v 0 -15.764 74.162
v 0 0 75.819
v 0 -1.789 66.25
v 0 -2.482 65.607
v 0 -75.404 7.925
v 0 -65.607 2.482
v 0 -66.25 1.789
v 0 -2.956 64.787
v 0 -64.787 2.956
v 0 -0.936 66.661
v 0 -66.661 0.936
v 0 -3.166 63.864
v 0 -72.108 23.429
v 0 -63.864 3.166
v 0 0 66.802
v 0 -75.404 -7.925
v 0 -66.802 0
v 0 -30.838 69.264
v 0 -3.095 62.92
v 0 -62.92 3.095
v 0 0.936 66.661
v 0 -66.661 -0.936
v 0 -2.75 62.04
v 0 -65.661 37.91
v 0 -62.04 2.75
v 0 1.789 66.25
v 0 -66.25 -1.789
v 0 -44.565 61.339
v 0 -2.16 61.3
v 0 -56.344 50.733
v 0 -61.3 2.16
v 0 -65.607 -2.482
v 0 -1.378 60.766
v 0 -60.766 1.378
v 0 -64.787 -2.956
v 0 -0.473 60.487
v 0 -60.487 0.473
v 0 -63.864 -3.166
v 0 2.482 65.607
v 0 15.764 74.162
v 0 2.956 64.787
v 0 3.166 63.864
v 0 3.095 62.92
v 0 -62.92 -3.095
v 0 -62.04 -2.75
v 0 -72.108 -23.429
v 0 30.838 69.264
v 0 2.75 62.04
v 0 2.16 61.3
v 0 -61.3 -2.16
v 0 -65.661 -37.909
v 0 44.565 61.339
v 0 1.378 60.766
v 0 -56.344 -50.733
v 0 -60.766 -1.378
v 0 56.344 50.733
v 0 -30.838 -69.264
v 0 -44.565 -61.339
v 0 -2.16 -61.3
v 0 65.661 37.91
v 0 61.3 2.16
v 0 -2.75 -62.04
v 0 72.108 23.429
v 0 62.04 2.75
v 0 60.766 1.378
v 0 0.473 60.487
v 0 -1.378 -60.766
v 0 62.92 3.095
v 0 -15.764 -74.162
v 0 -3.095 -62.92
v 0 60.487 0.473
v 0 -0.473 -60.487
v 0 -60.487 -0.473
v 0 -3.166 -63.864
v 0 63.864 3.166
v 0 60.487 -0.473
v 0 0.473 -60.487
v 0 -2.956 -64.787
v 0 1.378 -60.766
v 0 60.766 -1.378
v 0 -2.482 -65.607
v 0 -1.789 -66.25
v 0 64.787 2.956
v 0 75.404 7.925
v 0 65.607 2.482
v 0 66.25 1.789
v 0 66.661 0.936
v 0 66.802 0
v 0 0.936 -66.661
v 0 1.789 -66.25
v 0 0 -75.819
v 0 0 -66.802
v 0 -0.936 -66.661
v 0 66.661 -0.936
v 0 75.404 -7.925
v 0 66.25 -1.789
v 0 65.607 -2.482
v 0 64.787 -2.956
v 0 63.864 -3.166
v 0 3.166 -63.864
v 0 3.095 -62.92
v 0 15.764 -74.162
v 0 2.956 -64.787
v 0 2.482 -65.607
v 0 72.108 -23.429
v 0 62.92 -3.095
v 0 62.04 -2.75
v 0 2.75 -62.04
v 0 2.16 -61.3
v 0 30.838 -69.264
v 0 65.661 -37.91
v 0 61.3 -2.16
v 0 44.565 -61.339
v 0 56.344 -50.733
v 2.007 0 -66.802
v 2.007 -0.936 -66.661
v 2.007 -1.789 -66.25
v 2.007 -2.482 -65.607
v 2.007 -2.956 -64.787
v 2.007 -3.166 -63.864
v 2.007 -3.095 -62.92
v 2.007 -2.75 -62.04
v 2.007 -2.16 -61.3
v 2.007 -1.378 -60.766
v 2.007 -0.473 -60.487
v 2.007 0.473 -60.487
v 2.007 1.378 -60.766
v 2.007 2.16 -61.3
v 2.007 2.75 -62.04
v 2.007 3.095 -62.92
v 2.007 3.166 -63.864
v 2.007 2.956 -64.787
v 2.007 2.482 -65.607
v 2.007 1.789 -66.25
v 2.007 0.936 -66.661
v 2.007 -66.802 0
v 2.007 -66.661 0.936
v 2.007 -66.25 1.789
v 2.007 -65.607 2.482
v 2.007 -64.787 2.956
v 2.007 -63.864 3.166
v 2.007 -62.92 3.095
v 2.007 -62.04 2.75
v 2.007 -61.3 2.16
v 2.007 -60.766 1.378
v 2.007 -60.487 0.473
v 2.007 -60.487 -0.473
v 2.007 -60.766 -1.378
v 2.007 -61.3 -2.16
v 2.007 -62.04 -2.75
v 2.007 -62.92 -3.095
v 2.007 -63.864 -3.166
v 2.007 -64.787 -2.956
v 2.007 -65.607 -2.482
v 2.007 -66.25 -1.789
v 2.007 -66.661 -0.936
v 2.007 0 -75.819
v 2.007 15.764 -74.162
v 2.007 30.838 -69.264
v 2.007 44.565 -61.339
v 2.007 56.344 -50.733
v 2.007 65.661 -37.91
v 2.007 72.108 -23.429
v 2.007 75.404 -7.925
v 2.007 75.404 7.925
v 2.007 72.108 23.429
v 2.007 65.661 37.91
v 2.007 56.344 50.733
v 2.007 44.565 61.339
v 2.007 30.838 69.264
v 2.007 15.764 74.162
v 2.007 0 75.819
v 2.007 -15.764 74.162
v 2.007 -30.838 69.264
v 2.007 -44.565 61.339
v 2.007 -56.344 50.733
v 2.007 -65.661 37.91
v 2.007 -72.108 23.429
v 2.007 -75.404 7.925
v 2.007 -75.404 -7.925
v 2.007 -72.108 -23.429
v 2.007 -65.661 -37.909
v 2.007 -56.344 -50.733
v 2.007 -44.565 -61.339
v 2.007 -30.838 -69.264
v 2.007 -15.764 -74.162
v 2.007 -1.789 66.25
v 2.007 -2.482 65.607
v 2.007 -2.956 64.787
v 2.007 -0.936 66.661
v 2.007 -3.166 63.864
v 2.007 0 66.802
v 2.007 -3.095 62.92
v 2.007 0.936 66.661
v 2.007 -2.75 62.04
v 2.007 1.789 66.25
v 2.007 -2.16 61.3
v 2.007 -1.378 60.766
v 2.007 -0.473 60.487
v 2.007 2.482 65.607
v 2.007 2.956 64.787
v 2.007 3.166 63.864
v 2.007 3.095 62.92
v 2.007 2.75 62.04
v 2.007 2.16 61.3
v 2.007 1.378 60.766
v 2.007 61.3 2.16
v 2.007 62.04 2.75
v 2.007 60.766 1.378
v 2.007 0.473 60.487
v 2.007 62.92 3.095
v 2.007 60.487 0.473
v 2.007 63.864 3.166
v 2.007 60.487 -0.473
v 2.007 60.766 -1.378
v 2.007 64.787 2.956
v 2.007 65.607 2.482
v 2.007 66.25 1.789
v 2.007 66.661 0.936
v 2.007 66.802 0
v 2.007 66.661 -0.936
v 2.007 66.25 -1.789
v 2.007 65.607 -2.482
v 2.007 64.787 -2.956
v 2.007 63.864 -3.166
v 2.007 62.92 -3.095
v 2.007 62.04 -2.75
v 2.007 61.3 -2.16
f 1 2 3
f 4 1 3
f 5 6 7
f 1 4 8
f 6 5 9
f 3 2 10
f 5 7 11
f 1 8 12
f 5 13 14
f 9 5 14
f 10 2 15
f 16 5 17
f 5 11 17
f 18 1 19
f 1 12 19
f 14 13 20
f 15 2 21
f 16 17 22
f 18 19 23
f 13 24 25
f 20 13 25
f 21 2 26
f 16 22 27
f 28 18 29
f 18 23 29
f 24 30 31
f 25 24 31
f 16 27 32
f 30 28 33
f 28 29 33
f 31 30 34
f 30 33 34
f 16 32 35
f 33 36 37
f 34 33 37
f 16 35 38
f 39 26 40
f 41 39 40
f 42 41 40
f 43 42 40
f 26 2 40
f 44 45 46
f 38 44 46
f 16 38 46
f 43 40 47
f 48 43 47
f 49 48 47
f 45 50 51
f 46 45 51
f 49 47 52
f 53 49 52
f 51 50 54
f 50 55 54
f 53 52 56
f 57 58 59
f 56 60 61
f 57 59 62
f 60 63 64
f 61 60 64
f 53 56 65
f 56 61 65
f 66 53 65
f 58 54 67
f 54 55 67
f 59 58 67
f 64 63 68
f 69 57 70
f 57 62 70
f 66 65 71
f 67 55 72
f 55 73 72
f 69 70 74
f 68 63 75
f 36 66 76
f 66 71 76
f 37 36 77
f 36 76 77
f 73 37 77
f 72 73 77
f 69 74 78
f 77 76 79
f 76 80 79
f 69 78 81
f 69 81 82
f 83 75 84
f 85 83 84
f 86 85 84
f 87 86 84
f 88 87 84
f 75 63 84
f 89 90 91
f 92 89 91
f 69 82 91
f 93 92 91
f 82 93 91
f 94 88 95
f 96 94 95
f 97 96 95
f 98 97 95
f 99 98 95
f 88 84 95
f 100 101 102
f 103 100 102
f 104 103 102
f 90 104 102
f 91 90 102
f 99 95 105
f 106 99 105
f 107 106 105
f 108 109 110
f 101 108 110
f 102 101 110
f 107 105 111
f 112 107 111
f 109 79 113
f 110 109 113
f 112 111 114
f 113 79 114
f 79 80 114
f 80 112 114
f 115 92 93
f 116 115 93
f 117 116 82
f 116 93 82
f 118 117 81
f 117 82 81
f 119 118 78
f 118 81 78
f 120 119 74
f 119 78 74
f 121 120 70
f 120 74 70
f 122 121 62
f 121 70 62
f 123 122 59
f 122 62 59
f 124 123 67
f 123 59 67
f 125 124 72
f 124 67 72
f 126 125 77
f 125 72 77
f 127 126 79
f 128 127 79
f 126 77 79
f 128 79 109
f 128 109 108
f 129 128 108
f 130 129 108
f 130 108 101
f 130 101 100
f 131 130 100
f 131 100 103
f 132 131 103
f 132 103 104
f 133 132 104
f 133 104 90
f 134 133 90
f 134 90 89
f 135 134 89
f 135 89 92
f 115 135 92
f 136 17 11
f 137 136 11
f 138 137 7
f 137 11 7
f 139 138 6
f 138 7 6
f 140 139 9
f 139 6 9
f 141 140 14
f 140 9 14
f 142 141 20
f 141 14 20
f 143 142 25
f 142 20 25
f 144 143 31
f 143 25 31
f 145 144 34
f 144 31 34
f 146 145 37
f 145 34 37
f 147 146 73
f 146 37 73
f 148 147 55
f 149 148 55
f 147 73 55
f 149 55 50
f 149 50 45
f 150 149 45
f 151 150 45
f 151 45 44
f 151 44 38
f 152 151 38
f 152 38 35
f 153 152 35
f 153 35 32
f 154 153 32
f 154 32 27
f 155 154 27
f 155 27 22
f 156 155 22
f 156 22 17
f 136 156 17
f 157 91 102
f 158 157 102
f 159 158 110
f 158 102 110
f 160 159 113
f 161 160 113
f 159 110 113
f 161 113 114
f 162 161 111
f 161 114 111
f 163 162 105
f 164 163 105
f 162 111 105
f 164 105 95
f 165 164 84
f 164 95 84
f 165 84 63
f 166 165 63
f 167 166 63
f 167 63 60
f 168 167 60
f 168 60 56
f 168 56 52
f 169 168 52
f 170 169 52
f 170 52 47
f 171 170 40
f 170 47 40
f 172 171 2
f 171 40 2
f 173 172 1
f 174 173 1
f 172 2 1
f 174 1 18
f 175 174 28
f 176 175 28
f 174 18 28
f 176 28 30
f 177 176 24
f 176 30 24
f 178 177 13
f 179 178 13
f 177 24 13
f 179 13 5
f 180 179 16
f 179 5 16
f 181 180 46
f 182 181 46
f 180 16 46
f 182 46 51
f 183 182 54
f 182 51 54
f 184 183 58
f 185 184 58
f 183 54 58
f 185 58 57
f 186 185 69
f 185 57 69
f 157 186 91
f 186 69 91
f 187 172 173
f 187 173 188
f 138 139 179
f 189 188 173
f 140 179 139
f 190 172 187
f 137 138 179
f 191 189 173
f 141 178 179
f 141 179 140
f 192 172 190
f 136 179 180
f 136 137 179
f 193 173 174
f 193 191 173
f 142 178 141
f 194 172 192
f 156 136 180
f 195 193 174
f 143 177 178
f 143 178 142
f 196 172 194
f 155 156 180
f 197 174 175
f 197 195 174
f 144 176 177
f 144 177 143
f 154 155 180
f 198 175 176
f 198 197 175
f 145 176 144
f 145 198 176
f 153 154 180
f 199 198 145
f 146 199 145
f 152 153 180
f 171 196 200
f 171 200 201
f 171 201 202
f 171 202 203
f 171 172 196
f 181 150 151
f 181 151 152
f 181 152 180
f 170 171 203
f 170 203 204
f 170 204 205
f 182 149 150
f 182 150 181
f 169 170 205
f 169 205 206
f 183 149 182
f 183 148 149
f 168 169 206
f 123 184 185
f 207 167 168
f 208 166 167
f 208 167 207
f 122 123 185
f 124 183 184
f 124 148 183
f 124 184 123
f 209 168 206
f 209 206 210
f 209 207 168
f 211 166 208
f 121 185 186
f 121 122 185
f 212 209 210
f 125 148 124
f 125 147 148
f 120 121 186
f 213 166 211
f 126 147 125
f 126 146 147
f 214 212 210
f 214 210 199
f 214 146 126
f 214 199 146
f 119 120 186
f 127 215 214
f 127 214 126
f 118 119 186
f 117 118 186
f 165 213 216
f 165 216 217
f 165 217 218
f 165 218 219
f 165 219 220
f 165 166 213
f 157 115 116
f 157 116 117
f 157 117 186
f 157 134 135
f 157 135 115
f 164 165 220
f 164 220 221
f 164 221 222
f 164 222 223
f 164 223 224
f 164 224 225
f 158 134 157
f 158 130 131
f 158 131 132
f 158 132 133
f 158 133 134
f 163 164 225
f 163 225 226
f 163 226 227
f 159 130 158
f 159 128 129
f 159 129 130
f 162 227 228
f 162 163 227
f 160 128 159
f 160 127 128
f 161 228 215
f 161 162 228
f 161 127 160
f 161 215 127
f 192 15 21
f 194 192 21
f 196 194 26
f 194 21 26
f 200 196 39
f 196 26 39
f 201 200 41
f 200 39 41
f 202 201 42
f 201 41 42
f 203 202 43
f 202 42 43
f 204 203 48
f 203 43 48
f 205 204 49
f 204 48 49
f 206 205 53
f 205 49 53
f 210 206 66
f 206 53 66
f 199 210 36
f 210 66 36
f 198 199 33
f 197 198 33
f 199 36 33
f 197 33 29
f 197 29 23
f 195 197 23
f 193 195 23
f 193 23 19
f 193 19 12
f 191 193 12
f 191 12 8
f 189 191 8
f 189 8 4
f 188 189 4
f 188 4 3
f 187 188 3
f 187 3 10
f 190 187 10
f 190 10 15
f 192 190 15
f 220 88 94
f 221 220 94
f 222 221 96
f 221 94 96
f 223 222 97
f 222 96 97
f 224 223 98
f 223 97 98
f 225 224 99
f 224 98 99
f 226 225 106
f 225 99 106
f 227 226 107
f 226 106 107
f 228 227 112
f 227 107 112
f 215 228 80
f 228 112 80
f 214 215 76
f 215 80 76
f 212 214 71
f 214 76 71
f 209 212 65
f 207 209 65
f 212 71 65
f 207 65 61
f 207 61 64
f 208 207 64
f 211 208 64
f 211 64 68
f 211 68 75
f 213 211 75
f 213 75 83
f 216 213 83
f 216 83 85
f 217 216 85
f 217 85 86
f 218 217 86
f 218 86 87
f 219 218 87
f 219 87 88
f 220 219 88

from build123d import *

# Parameters (mm, degrees)
SKETCH1_R           = 75.819
BOSS_EXTRUDE1_DEPTH = 2.0066
SKETCH2_R           = 3.175
CUT_EXTRUDE1_DEPTH  = 108.243032247
CIRPATTERN1_COUNT   = 4


with BuildPart() as part:
    # Sketch1 → Boss-Extrude1 (new body)
    with BuildSketch(Plane.YZ):
        with Locations(Location((0, 0, 0), (0, 0, 270))):
            Circle(SKETCH1_R)
    extrude(amount=BOSS_EXTRUDE1_DEPTH)

    # Sketch2 → Cut-Extrude1 (cut, through all)
    with BuildSketch(Plane.ZY):
        with Locations((63.627, 0)):
            Circle(SKETCH2_R)
    cut_extrude1 = extrude(amount=-CUT_EXTRUDE1_DEPTH, mode=Mode.SUBTRACT)

    # CirPattern1: Cut-Extrude1 ×4 about axis
    cirpattern1_axis = Axis((0, 0, 0), (1, 0, 0))
    for i in range(1, CIRPATTERN1_COUNT):
        add(cut_extrude1.rotate(cirpattern1_axis, i * 360 / CIRPATTERN1_COUNT), mode=Mode.SUBTRACT)


solid = part.part
